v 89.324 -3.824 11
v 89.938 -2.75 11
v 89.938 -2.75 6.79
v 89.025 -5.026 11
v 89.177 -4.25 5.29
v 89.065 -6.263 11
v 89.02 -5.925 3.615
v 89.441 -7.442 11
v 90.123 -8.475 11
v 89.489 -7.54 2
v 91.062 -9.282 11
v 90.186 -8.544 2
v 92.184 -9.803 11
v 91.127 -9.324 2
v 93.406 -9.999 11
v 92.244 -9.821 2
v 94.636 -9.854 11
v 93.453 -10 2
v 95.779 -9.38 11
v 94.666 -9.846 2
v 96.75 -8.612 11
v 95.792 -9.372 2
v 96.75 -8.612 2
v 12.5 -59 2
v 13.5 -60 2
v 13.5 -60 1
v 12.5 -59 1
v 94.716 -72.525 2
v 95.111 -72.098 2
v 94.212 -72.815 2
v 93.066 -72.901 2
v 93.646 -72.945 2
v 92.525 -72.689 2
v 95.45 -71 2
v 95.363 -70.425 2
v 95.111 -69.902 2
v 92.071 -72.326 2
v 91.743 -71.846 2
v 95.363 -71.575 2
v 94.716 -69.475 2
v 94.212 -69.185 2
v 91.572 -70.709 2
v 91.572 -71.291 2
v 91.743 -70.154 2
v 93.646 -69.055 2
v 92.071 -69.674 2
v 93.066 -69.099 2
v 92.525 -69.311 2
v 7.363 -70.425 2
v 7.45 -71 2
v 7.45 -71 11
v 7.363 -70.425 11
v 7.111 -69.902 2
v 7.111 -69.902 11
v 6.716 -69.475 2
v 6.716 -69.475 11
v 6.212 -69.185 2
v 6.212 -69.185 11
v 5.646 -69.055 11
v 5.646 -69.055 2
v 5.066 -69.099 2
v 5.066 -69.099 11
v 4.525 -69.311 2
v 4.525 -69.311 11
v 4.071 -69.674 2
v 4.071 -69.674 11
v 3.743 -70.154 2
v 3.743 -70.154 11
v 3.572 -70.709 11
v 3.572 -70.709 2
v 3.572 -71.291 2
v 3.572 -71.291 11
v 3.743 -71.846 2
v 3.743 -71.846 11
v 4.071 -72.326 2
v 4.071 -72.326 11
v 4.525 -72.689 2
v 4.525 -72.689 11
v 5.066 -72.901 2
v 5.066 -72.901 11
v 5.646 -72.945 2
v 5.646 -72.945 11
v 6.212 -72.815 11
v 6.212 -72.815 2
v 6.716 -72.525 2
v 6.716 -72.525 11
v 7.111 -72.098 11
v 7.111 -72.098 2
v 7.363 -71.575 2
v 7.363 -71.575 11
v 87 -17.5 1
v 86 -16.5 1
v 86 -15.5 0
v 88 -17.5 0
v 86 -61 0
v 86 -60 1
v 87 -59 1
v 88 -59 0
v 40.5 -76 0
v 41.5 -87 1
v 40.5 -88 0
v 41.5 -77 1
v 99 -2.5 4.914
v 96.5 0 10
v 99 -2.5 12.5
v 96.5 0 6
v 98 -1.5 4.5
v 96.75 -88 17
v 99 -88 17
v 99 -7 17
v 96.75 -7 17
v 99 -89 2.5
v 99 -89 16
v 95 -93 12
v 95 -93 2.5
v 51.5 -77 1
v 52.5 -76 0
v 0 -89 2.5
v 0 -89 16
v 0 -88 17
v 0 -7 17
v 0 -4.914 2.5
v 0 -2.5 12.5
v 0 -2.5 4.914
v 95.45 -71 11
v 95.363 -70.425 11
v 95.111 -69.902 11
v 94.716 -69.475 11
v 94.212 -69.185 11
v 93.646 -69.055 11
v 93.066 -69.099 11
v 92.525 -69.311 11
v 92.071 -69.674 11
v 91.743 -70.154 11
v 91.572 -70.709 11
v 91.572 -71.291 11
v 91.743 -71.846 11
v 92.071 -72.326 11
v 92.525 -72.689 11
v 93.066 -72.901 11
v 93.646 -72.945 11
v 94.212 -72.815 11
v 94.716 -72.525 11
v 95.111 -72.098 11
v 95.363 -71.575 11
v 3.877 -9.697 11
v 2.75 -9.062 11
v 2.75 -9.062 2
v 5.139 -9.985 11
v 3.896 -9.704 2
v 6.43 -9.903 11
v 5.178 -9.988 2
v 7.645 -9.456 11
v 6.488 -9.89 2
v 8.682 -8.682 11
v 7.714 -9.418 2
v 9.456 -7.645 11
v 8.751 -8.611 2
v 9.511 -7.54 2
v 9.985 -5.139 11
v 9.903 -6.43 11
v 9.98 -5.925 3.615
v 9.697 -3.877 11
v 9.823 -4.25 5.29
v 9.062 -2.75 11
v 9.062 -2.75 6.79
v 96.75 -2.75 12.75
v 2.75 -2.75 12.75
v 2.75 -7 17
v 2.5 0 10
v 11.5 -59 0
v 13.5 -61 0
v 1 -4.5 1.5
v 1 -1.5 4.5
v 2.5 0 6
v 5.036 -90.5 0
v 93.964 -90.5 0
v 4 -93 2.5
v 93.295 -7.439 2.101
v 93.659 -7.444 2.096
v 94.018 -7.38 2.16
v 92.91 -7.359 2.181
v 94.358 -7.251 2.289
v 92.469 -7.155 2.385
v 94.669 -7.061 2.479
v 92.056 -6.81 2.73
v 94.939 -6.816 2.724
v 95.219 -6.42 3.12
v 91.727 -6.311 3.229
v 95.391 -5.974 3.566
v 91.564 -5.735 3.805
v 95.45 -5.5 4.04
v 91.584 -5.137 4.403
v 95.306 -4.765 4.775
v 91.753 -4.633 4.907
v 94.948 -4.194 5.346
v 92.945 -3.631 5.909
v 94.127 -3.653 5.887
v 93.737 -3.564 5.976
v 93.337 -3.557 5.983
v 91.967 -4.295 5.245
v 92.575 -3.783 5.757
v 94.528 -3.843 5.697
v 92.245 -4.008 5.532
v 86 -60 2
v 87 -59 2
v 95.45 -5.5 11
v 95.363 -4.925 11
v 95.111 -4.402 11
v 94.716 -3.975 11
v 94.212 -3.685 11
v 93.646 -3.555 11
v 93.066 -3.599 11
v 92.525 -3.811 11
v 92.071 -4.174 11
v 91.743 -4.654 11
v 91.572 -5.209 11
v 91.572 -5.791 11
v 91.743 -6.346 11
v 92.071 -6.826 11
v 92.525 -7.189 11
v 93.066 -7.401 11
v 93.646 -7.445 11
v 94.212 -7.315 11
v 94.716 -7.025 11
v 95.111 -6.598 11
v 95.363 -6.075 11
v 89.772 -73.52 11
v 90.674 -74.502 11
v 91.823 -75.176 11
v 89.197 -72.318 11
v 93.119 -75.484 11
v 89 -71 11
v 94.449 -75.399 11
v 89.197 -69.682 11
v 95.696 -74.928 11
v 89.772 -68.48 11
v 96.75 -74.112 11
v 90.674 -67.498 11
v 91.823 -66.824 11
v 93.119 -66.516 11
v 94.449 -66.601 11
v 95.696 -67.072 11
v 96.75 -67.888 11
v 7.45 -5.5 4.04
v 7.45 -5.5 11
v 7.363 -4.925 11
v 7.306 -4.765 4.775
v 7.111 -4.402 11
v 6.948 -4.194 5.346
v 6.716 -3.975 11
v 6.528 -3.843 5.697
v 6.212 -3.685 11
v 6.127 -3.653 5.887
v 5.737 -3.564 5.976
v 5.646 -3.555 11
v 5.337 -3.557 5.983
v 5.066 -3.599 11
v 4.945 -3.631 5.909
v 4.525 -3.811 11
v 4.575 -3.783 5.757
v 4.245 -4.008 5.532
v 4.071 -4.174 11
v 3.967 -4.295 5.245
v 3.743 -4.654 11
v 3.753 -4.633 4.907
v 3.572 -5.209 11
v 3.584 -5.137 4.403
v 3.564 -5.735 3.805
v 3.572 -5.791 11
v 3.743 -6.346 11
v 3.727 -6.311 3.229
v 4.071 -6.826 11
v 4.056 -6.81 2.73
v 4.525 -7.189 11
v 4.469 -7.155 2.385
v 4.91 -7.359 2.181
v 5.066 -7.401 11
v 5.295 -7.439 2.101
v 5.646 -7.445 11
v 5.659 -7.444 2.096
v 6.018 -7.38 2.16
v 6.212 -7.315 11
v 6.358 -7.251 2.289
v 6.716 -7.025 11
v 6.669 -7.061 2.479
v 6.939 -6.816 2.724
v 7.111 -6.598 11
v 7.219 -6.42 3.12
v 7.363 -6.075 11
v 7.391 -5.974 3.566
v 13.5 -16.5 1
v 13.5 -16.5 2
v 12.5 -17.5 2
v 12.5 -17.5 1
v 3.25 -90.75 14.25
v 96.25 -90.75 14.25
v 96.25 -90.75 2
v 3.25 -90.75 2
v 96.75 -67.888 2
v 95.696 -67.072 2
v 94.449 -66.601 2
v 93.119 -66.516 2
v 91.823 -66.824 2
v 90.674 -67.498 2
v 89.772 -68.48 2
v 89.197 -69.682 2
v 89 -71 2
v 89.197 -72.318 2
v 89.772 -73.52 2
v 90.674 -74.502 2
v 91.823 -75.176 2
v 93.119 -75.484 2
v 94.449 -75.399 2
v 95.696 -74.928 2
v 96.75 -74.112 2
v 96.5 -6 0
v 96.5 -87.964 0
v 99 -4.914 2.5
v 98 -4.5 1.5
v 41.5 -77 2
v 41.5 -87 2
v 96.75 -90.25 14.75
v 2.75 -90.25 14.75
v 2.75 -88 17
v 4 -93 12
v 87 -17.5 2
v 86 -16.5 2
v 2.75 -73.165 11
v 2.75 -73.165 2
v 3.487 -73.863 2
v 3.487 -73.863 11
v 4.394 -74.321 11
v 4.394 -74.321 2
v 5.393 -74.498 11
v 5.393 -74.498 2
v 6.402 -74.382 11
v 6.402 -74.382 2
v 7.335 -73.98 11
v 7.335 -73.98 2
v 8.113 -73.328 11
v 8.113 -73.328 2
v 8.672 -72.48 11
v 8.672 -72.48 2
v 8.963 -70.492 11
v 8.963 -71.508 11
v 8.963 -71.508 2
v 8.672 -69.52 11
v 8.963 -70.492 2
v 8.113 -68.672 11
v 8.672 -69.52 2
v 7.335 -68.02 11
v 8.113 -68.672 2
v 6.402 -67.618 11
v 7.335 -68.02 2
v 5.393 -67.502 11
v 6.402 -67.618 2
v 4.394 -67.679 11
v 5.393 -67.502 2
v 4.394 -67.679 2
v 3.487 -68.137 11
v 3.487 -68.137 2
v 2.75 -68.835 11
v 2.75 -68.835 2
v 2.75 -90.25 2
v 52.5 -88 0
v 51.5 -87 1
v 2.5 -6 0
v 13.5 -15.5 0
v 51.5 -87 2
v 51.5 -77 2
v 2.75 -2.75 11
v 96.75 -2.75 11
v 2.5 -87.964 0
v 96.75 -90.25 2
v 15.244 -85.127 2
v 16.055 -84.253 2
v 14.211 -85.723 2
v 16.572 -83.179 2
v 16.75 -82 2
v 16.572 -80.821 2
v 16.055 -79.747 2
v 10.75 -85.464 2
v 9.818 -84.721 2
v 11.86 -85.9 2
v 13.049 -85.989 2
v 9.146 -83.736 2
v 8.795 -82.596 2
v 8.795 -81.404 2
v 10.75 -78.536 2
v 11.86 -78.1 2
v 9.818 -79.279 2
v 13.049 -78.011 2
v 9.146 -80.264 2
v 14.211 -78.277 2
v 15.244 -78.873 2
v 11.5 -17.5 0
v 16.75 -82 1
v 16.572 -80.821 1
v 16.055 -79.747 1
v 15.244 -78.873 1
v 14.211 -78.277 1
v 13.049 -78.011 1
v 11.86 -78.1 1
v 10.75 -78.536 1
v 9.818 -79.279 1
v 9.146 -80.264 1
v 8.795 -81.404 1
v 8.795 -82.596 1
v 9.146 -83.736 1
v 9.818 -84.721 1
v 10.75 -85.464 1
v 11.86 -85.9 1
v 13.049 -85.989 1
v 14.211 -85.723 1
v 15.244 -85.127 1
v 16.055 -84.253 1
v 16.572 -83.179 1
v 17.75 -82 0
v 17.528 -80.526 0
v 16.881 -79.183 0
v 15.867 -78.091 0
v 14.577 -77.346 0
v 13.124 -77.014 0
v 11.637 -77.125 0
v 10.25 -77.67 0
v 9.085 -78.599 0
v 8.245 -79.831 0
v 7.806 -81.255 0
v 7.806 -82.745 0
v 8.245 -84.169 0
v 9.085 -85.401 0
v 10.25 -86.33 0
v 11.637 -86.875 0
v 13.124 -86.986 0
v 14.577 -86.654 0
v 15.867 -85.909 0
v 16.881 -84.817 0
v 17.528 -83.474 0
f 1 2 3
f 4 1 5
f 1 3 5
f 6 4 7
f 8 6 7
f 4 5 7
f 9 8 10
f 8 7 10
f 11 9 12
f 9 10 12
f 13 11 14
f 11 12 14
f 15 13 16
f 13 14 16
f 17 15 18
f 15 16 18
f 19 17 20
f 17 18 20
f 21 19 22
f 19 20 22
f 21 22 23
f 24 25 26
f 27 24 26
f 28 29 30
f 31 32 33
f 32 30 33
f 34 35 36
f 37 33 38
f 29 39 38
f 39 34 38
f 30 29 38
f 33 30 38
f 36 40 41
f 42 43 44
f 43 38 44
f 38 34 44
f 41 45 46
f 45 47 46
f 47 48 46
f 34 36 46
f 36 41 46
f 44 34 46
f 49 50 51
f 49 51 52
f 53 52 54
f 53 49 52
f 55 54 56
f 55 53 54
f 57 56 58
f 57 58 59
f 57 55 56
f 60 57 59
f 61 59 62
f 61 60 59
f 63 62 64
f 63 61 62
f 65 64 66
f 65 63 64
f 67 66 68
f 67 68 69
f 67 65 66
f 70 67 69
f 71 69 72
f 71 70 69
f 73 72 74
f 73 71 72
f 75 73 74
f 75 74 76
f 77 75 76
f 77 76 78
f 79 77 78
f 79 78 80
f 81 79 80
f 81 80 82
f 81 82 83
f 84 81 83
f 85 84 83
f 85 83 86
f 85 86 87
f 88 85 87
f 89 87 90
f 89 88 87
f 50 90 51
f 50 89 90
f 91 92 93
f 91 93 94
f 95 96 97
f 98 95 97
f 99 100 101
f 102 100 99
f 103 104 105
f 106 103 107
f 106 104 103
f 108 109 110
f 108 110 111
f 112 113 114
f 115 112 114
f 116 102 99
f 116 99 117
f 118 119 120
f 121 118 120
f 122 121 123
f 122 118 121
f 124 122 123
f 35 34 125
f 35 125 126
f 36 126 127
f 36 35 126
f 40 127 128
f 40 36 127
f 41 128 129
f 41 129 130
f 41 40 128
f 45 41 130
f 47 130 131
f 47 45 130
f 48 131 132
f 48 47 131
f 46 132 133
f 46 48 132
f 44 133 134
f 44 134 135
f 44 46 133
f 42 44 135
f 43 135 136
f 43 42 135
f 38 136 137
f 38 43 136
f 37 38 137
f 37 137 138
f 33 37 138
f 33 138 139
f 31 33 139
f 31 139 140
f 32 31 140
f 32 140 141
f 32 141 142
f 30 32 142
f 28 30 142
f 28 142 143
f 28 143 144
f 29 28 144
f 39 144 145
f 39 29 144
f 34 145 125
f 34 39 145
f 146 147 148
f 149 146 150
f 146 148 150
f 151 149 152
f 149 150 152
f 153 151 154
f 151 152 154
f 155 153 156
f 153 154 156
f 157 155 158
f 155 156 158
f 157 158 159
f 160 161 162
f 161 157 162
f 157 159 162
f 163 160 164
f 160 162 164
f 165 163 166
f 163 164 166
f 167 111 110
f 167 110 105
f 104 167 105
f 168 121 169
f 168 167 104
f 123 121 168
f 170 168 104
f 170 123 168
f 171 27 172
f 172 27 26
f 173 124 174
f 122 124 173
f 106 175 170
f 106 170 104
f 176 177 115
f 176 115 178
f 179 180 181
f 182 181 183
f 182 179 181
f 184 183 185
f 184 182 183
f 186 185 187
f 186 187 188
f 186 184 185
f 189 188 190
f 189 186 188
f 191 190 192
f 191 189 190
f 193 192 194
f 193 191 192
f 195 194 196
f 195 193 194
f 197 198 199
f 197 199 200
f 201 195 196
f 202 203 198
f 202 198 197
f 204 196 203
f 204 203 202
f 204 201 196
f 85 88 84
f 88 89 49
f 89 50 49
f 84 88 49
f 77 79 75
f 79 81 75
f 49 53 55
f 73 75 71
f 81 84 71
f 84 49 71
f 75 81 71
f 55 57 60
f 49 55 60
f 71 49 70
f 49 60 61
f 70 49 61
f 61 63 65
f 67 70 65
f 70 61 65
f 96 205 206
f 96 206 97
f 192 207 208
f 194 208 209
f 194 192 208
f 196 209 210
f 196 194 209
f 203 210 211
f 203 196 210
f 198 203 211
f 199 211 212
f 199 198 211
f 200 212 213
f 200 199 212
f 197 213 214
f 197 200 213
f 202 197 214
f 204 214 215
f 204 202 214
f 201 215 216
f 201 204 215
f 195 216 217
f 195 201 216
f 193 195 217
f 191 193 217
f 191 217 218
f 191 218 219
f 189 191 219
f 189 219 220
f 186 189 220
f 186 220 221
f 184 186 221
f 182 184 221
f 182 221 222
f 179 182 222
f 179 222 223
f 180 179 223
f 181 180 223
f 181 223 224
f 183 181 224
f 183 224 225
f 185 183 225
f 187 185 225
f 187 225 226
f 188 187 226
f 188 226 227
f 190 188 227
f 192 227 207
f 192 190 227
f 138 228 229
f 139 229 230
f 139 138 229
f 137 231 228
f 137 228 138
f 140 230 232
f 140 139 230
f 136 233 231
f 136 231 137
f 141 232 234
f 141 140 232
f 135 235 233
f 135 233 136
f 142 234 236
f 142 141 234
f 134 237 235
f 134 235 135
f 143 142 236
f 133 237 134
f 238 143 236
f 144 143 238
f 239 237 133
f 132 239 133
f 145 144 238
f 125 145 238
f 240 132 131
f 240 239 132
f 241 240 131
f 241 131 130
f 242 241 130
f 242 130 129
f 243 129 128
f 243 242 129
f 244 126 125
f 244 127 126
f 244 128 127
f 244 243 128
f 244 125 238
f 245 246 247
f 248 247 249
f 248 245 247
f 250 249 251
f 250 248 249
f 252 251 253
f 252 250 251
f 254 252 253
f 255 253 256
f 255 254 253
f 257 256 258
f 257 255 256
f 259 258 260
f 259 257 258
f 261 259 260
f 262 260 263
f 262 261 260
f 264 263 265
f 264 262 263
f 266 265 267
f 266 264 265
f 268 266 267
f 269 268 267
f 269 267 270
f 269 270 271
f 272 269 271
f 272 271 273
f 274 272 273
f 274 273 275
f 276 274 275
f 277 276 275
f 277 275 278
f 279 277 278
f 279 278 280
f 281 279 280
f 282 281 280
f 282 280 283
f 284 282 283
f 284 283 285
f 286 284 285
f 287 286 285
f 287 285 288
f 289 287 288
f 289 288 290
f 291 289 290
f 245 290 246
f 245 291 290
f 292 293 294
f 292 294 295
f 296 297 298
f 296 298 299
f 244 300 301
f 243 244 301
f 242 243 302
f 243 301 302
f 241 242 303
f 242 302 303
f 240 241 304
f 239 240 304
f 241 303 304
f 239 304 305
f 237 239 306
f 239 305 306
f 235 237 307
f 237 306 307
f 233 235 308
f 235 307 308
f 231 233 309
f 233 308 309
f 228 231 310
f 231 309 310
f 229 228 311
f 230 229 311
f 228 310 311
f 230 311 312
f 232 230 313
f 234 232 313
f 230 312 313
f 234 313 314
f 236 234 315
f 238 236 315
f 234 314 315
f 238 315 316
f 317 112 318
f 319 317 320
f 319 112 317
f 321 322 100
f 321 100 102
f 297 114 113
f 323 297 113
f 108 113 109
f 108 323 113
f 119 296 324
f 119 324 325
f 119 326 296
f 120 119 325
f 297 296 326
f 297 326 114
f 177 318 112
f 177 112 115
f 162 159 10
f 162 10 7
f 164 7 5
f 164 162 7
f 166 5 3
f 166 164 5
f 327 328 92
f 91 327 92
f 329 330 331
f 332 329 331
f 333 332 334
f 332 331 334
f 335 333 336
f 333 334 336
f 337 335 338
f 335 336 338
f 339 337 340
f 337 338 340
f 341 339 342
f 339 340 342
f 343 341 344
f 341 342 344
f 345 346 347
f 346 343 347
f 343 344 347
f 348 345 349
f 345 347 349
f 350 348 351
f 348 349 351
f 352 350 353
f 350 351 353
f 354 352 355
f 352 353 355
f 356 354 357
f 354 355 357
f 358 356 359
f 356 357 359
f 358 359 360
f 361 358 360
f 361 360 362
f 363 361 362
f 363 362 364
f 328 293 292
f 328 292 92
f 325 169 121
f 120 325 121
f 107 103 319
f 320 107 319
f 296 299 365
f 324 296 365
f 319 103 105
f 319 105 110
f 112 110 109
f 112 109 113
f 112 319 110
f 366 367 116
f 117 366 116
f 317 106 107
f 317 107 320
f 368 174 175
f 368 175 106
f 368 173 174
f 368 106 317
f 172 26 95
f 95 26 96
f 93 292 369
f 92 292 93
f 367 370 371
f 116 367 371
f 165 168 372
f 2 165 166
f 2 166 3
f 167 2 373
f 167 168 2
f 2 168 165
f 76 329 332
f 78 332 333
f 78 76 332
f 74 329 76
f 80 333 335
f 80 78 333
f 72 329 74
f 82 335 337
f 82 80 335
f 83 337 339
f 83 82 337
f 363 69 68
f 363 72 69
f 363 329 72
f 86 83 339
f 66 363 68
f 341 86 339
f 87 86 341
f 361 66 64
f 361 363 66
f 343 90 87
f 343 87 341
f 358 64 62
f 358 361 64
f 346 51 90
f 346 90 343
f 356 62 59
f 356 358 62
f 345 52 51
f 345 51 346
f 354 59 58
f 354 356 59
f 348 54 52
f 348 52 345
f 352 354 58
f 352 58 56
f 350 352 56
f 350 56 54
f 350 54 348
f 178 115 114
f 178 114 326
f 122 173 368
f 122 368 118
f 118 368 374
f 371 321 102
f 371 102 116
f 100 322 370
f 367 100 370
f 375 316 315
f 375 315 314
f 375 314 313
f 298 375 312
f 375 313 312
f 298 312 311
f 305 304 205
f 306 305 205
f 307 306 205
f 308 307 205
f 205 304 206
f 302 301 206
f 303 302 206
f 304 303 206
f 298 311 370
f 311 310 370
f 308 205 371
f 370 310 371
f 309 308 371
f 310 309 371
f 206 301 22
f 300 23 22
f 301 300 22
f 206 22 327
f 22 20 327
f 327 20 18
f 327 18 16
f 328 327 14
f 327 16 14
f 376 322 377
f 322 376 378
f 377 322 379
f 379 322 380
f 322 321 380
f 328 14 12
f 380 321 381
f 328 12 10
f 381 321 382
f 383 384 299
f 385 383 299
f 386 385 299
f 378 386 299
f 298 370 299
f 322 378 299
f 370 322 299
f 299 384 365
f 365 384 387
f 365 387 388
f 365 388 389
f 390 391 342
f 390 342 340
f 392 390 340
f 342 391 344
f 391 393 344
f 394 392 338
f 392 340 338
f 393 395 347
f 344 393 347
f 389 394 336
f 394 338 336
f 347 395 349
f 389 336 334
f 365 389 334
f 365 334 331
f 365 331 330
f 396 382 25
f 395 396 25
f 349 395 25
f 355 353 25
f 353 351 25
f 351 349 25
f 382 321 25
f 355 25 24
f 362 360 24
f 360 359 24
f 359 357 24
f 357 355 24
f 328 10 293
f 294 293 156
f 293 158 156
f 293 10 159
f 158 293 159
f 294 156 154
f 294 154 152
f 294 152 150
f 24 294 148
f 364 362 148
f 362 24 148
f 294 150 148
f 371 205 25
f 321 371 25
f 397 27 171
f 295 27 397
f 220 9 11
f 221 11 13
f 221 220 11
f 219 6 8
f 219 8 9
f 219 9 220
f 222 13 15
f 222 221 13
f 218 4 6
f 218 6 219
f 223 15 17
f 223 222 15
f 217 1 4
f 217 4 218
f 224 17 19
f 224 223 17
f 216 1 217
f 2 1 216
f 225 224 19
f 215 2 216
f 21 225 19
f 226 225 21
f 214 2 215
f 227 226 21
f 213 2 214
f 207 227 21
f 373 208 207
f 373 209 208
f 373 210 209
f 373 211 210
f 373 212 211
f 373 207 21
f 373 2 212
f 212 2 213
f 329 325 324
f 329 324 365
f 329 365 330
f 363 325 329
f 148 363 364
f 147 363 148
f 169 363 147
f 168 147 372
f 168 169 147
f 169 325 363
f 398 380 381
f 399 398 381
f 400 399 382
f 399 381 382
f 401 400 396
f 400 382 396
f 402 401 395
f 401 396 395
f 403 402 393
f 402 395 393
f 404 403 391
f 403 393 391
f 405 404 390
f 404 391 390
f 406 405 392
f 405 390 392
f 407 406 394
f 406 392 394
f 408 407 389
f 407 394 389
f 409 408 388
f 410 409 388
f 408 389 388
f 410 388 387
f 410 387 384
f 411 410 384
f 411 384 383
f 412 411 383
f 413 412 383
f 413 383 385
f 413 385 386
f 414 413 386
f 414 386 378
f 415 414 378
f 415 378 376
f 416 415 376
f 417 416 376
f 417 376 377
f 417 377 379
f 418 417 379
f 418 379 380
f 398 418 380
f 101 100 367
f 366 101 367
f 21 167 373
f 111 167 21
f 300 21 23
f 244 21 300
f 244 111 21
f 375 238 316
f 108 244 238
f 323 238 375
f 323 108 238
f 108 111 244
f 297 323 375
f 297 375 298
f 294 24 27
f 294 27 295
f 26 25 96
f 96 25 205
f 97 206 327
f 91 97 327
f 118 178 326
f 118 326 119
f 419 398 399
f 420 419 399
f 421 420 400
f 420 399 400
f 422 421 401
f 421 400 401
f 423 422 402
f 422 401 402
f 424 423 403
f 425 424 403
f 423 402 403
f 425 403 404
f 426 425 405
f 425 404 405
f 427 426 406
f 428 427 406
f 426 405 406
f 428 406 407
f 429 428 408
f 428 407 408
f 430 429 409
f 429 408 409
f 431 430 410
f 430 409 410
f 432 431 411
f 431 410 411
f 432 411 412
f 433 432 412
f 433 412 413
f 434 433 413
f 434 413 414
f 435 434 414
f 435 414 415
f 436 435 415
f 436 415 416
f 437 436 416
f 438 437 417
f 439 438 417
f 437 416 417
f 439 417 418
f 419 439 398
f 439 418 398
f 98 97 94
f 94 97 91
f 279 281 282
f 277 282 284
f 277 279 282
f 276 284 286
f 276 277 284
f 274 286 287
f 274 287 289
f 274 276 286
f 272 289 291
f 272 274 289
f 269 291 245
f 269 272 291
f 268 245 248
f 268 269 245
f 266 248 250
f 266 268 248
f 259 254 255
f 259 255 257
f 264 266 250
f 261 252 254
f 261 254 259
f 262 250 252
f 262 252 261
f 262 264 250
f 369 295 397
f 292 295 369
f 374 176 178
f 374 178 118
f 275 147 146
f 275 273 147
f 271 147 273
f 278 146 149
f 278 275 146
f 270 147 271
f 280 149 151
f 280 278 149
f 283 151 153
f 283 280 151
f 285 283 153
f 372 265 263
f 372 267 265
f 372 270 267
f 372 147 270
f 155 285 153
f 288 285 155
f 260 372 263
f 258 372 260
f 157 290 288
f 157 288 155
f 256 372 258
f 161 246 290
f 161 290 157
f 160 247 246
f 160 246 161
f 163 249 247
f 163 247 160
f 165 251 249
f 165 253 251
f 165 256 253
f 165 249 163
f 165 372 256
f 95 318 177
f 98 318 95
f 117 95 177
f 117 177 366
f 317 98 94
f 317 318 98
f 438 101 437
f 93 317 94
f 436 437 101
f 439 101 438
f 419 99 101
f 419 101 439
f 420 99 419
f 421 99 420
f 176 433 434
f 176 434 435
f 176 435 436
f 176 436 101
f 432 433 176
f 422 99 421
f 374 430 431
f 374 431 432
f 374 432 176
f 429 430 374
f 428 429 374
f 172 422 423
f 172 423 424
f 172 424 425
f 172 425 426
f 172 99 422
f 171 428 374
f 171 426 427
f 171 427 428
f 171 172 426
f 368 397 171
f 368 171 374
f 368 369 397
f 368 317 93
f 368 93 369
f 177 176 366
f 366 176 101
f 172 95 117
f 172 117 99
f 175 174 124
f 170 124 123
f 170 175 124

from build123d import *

# Parameters (mm, degrees)
PAD_DEPTH       = 17
POCKET_DEPTH    = 15
SKETCH002_R     = 4
SKETCH002_W     = 74.5
SKETCH002_H     = 43.5
SKETCH002_W_2   = 10
SKETCH002_H_2   = 10
POCKET001_DEPTH = 482
SKETCH003_R     = 4.5
SKETCH003_R_2   = 1.95
SKETCH003_R_3   = 3.5
PAD001_DEPTH    = 9
POCKET002_DEPTH = 99
PAD002_DEPTH    = 99
CHAMFER_SIZE    = 2.5
CHAMFER001_SIZE = 1


with BuildPart() as part:
    # Sketch → Pad (new body)
    with BuildSketch(Plane.XY):
        Polygon((0, 0), (99, 0), (99, -89), (95, -93), (4, -93), (0, -89), align=None)
    extrude(amount=PAD_DEPTH)

    # Sketch001 → Pocket (cut)
    with BuildSketch(Plane.XY.offset(17)):
        Polygon((2.75, -2.75), (96.75, -2.75), (96.75, -90.25), (96.25, -90.75), (3.25, -90.75), (2.75, -90.25), align=None)
    extrude(amount=-POCKET_DEPTH, mode=Mode.SUBTRACT)

    # Sketch002 (on Sketch) → Pocket001 (cut)
    with BuildSketch(Plane.XY.offset(482)):
        with Locations((12.75, -82)):
            Circle(SKETCH002_R)
        with Locations((49.75, -38.25)):
            Rectangle(SKETCH002_W, SKETCH002_H)
        with Locations((46.5, -82)):
            Rectangle(SKETCH002_W_2, SKETCH002_H_2)
    extrude(amount=-POCKET001_DEPTH, mode=Mode.SUBTRACT)

    # Sketch003 → Pad001 (join)
    with BuildSketch(Plane.XY.offset(2)):
        with Locations((5.5, -5.5)):
            Circle(SKETCH003_R)
        with Locations((5.5, -5.5)):
            Circle(SKETCH003_R_2, mode=Mode.SUBTRACT)
        with Locations((93.5, -5.5)):
            Circle(SKETCH003_R)
        with Locations((93.5, -5.5)):
            Circle(SKETCH003_R_2, mode=Mode.SUBTRACT)
        with Locations((5.5, -71)):
            Circle(SKETCH003_R_3)
        with Locations((5.5, -71)):
            Circle(SKETCH003_R_2, mode=Mode.SUBTRACT)
        with Locations((93.5, -71)):
            Circle(SKETCH003_R)
        with Locations((93.5, -71)):
            Circle(SKETCH003_R_2, mode=Mode.SUBTRACT)
    extrude(amount=PAD001_DEPTH)

    # Sketch004 → Pocket002 (cut)
    with BuildSketch(Plane.YZ):
        Polygon((-93, 24.5), (-93, 12), (-80.5, 24.5), align=None)
        Polygon((-12.5, 22.5), (0, 10), (0, 22.5), align=None)
        Polygon((0, 0), (0, 6), (-6, 0), align=None)
    extrude(amount=POCKET002_DEPTH, mode=Mode.SUBTRACT)

    # Sketch005 → Pad002 (join)
    with BuildSketch(Plane.YZ):
        Polygon((0, 6), (-6, 0), (-9.54, 0), (0, 9.54), align=None)
    extrude(amount=PAD002_DEPTH)

    # Chamfer
    chamfer_edges = [part.edges().sort_by_distance(p)[0] for p in [
        (99, -47.5, 0),
        (97, -91, 0),
        (49.5, -93, 0),
        (2, -91, 0),
        (0, -47.5, 0),
        (99, 0, 8),
        (0, 0, 8),
    ]]
    chamfer(chamfer_edges, length=CHAMFER_SIZE)

    # Chamfer001
    chamfer001_edges = [part.edges().sort_by_distance(p)[0] for p in [
        (99, -3, 3),
        (0, -3, 3),
        (12.5, -38.25, 0),
        (49.75, -16.5, 0),
        (49.75, -60, 0),
        (87, -38.25, 0),
        (51.5, -82, 0),
        (46.5, -87, 0),
        (41.5, -82, 0),
        (46.5, -77, 0),
        (8.75, -82, 0),
        (12.5, -60, 1),
        (87, -16.5, 1),
        (12.5, -16.5, 1),
        (87, -60, 1),
    ]]
    chamfer(chamfer001_edges, length=CHAMFER001_SIZE)


solid = part.part
